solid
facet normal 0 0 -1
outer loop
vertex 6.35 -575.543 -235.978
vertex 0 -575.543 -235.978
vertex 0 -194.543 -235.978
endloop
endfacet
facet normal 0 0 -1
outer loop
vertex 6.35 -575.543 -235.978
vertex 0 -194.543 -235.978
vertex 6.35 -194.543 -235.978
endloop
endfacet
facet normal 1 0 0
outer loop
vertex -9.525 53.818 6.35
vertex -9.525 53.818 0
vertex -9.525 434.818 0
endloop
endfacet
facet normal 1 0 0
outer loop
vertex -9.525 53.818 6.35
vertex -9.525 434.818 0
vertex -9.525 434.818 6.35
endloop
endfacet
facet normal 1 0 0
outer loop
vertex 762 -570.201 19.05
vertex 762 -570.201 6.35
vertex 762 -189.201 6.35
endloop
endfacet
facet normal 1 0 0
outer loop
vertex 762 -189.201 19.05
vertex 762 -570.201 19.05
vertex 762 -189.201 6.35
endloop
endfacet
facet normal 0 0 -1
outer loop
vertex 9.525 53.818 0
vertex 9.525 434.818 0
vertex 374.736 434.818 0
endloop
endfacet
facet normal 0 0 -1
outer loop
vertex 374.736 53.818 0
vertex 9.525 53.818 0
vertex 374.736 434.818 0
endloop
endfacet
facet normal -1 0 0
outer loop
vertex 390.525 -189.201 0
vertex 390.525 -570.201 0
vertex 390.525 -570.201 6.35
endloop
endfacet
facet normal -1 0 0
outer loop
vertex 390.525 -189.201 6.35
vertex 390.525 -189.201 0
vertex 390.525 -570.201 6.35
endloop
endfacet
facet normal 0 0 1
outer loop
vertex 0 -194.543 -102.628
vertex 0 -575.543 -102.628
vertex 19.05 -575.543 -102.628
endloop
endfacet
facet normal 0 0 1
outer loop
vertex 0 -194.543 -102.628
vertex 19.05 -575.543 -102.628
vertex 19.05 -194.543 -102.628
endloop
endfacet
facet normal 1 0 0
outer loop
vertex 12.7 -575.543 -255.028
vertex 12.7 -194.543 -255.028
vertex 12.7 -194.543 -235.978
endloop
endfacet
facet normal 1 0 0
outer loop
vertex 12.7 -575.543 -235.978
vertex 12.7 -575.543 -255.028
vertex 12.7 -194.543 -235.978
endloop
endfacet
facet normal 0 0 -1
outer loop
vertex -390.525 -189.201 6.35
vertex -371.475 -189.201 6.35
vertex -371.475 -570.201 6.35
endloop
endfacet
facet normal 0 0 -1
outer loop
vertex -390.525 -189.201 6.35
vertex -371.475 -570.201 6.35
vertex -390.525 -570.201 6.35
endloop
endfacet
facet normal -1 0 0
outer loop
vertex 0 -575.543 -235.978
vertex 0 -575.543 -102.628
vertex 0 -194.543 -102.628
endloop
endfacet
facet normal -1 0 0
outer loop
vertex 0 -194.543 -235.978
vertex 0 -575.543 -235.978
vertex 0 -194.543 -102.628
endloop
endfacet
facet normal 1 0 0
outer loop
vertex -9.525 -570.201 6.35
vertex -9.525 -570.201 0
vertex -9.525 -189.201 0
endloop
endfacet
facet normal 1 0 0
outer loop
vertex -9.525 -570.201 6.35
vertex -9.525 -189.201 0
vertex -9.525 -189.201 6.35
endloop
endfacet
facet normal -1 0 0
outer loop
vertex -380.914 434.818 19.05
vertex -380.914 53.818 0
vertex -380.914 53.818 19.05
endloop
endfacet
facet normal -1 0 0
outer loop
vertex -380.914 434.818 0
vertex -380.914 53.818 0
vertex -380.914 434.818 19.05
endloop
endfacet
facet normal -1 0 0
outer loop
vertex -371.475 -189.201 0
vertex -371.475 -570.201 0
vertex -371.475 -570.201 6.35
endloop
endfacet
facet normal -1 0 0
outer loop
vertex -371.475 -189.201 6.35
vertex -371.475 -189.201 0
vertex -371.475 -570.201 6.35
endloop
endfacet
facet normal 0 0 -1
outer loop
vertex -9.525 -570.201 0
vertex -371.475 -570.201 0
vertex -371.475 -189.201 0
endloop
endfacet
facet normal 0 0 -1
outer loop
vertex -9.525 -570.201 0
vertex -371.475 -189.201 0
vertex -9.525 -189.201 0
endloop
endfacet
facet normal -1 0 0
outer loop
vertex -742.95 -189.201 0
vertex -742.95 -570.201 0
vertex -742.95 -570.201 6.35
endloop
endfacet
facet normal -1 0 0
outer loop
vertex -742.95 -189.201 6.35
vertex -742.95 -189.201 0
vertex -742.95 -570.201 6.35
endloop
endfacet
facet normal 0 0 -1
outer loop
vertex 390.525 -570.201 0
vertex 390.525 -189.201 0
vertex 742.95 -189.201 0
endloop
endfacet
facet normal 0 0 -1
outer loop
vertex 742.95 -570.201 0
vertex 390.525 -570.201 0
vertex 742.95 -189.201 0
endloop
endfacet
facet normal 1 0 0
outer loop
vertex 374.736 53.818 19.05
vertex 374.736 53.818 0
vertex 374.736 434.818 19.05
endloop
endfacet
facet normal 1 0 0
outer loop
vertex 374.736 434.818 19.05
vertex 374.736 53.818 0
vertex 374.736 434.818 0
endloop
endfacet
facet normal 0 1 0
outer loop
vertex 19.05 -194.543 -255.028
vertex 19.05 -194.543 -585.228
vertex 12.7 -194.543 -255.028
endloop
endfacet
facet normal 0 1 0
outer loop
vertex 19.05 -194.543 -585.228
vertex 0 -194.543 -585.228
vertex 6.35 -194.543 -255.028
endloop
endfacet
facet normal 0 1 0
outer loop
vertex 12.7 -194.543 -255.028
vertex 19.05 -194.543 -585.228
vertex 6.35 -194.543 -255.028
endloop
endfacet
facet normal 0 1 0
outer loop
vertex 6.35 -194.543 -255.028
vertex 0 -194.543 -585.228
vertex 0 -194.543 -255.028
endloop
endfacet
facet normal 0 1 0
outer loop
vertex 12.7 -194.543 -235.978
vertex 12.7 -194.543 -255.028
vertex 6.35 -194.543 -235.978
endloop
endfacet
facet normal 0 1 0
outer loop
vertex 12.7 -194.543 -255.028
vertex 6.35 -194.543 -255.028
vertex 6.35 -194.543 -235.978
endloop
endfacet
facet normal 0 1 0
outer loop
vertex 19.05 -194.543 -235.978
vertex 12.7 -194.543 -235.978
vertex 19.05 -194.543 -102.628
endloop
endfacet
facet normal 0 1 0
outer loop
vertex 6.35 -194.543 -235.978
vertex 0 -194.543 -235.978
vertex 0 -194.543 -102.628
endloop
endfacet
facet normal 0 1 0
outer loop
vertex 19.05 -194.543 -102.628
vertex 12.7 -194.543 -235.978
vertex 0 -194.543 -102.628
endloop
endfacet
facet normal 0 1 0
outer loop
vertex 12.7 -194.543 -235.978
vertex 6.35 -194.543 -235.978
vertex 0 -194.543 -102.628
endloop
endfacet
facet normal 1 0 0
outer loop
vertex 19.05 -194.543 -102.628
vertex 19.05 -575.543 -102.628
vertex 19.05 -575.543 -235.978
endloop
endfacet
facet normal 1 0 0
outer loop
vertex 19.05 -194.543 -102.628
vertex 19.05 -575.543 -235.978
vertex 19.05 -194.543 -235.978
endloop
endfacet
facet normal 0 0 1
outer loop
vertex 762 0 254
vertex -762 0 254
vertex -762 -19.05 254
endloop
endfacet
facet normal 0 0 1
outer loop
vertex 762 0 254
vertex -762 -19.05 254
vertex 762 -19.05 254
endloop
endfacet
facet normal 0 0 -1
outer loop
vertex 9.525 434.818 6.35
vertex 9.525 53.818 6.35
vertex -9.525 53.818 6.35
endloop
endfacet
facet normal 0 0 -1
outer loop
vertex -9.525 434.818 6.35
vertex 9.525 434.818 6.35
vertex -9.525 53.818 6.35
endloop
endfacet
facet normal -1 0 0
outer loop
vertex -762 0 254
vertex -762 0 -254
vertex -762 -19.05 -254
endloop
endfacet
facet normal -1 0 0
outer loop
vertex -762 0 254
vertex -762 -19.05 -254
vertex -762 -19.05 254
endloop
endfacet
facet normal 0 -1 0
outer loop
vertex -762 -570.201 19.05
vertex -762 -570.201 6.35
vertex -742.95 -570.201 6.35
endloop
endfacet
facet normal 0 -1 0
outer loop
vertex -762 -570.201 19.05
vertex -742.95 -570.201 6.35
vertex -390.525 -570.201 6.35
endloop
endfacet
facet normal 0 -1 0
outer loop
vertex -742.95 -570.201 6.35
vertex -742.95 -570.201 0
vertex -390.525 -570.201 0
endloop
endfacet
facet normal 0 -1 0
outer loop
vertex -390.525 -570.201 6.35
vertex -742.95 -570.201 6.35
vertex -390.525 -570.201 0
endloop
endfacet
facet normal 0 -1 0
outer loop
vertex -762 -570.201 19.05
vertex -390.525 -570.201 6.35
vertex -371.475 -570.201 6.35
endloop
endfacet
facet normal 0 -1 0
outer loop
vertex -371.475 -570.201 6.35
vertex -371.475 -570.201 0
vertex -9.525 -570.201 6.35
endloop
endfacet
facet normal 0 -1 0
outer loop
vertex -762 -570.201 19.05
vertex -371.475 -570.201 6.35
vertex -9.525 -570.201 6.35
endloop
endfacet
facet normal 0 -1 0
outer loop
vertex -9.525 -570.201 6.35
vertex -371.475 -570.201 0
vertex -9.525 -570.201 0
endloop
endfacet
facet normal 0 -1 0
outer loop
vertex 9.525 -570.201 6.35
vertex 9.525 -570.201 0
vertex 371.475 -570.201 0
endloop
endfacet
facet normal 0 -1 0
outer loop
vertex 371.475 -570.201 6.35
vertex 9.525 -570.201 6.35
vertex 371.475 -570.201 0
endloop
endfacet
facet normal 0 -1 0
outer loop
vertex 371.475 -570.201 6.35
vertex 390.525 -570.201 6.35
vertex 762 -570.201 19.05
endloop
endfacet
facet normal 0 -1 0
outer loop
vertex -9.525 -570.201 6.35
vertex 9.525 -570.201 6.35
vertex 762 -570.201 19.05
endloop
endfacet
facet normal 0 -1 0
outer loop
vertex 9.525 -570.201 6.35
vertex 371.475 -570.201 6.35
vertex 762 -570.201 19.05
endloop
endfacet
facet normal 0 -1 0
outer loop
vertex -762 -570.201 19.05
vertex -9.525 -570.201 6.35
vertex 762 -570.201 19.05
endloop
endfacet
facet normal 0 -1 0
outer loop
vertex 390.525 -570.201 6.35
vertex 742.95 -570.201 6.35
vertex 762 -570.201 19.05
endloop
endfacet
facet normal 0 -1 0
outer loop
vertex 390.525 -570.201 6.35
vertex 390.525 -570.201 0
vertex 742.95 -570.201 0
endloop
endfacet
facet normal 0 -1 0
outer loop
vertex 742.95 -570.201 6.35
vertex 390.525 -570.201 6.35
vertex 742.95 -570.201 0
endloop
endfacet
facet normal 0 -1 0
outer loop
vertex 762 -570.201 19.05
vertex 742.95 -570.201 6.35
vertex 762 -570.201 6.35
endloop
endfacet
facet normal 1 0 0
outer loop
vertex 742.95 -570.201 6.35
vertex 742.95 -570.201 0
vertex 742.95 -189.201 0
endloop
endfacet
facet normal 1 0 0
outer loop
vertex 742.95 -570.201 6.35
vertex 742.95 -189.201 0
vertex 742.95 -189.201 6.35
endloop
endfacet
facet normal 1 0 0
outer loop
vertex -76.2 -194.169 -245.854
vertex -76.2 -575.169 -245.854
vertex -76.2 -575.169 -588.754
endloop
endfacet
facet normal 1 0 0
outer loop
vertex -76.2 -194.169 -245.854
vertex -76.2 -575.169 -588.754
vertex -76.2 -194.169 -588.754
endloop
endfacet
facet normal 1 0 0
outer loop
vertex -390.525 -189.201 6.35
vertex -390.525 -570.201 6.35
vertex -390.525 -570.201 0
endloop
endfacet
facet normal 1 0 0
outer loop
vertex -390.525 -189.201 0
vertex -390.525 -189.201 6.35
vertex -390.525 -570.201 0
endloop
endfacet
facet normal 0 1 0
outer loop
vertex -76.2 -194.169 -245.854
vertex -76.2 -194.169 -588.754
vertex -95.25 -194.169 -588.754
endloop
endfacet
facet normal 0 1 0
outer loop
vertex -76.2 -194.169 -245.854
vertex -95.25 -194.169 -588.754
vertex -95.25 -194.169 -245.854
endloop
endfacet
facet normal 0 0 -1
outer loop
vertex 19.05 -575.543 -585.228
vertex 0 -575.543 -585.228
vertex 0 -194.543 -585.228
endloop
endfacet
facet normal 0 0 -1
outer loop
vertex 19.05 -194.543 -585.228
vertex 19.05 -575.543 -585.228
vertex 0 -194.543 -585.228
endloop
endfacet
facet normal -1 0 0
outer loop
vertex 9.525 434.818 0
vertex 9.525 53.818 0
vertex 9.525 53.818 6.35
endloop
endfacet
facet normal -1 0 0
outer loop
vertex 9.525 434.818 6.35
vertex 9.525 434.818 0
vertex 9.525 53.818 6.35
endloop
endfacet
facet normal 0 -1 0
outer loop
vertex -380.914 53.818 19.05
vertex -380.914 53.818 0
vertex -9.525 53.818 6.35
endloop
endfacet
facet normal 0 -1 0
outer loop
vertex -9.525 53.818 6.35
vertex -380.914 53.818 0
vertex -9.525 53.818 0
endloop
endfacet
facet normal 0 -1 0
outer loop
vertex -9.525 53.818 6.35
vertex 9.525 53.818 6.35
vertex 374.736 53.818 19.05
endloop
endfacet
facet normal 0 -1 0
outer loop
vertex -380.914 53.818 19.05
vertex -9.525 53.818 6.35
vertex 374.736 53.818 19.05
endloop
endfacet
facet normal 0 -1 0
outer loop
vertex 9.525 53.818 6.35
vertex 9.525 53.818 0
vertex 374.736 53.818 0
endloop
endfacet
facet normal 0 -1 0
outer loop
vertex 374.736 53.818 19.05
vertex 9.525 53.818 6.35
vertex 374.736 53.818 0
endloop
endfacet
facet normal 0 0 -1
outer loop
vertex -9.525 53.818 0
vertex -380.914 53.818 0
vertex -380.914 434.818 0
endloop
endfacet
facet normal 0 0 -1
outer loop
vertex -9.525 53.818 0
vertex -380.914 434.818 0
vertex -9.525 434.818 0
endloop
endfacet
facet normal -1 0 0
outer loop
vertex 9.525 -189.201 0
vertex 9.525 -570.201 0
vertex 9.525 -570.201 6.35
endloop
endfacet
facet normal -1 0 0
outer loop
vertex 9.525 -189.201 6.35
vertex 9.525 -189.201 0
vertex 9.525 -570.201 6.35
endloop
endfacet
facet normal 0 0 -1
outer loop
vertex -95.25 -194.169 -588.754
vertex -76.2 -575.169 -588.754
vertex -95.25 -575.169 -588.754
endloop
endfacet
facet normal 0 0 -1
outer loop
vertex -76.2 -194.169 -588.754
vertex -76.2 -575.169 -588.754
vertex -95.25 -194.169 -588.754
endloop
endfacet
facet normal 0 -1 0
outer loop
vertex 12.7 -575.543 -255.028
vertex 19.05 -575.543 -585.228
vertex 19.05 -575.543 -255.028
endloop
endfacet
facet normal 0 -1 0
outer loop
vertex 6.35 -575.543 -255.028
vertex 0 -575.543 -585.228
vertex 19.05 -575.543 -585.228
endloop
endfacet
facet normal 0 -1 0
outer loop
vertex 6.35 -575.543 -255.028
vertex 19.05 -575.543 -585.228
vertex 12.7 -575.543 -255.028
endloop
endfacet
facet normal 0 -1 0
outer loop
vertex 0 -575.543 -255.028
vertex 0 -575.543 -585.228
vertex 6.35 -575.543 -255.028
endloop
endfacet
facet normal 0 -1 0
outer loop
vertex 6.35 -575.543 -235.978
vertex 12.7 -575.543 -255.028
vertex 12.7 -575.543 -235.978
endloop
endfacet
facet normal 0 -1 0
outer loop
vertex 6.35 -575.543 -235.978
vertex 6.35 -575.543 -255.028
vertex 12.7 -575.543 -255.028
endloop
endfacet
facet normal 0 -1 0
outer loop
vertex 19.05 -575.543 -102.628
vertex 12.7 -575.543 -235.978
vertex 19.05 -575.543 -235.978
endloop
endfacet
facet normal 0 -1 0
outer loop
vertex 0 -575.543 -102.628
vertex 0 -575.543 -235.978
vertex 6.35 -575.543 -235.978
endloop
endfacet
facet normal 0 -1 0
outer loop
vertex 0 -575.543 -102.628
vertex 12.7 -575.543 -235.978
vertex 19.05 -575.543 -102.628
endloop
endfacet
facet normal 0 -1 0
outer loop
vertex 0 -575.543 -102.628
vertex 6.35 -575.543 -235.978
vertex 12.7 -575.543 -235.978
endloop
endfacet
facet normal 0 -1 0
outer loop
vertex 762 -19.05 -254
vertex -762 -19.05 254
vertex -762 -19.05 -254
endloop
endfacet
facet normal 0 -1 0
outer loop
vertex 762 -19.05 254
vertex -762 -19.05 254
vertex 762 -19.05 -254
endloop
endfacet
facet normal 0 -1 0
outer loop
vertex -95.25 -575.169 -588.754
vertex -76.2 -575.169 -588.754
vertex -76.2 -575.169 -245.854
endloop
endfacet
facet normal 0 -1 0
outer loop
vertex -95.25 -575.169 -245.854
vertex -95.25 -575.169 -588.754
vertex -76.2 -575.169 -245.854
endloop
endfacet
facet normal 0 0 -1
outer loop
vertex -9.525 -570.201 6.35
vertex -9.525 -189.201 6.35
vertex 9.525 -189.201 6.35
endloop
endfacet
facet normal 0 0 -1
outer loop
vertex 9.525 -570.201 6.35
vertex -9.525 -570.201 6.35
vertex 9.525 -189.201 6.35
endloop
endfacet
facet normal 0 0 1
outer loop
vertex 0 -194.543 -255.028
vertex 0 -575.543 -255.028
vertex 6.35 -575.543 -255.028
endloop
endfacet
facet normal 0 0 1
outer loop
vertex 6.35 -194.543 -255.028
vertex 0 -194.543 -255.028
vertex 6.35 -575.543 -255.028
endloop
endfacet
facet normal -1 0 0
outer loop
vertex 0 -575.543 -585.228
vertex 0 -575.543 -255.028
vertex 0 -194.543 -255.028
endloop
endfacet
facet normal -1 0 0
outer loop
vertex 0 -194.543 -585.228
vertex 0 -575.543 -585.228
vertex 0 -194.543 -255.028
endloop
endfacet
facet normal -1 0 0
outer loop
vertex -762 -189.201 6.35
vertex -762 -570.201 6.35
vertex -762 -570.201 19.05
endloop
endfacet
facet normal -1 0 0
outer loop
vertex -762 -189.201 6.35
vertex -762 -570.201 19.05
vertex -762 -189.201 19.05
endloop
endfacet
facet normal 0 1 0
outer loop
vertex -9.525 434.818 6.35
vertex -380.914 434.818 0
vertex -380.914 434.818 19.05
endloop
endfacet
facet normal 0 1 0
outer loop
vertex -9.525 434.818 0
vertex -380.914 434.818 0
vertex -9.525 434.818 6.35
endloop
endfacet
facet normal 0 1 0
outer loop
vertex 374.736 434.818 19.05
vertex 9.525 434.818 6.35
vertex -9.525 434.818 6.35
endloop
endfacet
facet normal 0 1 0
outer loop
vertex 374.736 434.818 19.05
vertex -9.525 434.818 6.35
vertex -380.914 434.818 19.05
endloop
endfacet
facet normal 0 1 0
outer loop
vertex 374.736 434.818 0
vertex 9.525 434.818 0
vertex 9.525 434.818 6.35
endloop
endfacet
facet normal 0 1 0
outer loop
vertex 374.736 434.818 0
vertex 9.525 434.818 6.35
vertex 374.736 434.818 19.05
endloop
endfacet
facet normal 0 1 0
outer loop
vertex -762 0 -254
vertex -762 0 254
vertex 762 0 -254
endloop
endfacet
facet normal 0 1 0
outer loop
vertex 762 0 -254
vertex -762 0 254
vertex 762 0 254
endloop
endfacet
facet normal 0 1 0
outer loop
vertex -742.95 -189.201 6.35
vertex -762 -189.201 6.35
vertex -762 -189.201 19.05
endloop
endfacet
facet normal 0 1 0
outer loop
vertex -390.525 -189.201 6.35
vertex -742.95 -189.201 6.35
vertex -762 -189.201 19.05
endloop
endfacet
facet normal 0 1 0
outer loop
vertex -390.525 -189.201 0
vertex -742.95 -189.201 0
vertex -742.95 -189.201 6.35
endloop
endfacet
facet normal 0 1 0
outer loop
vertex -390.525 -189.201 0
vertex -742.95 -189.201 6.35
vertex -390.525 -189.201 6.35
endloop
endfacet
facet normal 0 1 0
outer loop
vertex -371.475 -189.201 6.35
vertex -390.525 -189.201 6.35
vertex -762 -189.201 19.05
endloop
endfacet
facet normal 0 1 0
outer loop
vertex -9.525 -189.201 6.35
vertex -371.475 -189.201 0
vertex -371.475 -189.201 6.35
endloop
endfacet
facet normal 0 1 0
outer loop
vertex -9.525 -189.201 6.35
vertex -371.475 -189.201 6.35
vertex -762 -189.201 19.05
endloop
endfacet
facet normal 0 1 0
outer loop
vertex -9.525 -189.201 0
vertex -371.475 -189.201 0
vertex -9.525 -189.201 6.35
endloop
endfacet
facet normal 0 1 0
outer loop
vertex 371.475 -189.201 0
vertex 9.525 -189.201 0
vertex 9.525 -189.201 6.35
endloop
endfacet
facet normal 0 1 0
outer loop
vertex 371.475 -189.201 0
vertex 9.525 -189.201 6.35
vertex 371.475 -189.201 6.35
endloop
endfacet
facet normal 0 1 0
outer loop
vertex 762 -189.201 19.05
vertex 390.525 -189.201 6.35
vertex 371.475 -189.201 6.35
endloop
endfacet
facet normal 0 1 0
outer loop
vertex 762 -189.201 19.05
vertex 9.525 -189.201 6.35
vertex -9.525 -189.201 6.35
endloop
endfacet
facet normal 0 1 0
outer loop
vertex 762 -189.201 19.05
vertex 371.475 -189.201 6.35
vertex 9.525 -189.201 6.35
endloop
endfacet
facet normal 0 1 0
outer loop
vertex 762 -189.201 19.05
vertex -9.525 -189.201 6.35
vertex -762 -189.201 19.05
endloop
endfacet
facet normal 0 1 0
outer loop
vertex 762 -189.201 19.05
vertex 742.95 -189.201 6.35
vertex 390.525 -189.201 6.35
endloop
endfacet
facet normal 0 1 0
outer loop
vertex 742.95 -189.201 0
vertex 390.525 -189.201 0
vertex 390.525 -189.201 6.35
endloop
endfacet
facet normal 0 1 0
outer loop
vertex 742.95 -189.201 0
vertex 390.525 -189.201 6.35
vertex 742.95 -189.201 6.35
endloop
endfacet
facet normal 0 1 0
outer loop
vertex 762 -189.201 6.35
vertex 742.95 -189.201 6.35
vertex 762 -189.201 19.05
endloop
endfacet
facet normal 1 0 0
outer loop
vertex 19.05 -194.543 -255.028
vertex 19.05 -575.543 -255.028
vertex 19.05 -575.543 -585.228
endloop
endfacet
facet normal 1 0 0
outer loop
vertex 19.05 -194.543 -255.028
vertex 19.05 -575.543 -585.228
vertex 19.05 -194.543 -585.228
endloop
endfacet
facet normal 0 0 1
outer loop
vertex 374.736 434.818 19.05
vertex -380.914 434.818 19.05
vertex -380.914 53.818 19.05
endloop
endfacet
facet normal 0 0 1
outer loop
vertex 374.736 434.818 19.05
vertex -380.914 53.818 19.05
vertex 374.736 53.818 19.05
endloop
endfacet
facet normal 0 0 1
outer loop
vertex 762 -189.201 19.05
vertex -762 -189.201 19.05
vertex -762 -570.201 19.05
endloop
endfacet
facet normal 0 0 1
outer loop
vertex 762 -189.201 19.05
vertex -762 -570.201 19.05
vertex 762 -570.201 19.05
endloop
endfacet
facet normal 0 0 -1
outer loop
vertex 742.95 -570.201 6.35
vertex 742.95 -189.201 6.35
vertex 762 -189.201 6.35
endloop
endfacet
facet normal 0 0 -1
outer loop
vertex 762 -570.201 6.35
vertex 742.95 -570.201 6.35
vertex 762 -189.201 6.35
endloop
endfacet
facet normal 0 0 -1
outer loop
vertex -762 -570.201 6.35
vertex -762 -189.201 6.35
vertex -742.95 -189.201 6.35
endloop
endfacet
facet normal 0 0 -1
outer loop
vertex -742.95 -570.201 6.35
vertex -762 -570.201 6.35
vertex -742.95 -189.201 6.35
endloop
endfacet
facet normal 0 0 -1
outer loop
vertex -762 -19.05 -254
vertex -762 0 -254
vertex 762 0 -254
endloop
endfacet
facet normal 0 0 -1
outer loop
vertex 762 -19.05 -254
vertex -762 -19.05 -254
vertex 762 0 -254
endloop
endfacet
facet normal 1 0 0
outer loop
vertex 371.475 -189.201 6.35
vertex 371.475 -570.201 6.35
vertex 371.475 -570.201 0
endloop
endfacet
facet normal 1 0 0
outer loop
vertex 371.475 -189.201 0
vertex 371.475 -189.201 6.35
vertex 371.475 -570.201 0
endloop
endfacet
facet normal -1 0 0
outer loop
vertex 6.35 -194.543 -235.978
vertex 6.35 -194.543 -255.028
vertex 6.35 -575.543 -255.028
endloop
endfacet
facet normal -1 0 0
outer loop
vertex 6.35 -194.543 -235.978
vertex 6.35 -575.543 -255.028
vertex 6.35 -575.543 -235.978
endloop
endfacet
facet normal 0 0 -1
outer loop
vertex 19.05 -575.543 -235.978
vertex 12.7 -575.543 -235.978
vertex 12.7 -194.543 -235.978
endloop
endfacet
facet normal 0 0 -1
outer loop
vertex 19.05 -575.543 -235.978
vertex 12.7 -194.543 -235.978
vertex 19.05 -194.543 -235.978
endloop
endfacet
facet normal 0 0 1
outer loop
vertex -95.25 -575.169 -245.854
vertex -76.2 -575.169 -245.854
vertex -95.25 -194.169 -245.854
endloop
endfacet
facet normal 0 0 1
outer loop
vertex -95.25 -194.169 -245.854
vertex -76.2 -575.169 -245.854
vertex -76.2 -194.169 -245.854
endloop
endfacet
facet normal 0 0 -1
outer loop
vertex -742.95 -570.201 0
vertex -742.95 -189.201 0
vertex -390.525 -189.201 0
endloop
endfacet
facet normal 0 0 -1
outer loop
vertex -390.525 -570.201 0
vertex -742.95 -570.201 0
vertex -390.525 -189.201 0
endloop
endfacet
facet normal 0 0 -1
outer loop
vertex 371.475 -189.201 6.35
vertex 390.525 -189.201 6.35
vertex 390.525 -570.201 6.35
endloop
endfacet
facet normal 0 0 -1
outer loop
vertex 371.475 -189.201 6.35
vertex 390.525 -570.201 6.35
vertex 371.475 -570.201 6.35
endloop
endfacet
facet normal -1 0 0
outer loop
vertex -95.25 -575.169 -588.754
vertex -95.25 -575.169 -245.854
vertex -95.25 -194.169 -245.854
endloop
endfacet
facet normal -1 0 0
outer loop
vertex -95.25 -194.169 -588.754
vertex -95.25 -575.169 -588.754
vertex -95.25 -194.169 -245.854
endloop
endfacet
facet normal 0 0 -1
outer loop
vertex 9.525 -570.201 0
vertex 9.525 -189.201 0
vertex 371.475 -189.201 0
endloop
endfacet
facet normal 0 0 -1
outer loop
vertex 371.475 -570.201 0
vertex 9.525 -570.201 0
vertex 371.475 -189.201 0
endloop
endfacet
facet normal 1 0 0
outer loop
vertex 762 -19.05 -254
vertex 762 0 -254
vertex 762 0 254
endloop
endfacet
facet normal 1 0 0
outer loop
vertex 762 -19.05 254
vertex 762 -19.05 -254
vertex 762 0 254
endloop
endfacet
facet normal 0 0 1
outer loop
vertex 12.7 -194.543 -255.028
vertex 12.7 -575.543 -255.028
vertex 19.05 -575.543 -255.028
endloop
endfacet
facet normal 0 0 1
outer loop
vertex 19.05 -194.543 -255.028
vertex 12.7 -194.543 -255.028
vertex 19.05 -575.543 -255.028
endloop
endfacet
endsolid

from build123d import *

# Parameters (mm, degrees)
F0_W      = 1524
F0_H      = 508
F1_DEPTH  = 19.05
F2_W      = 1524
F2_H      = 381
F3_DEPTH  = 19.05
F4_W      = 381
F4_H      = 482.6
F5_DEPTH  = 19.05
F6_W      = 19.05
F6_H      = 6.35
F7_DEPTH  = 381
F8_W      = 6.35
F8_H      = 19.05
F9_DEPTH  = 381
F10_W     = 755.65
F10_H     = 381
F11_DEPTH = 19.05
F12_W     = 19.05
F12_H     = 6.35
F13_DEPTH = 381
F15_START = -76.2
F14_W     = 381
F14_H     = 342.9
F15_DEPTH = 19.05


with BuildPart() as f1:
    # F0 (on Front) → F1 (new body)
    with BuildSketch(Plane.XZ):
        Rectangle(F0_W, F0_H)
    extrude(amount=F1_DEPTH)


with BuildPart() as f3:
    # F2 (on Top) → F3 (new body)
    with BuildSketch(Plane.XY):
        with Locations((0, -379.7005197639)):
            Rectangle(F2_W, F2_H)
    extrude(amount=F3_DEPTH)

    # F6 (on face) → F7 (cut)
    with BuildSketch(Plane.XZ.offset(570.2005197639)):
        with Locations((-752.475, 3.175)):
            Rectangle(F6_W, F6_H)
        Polygon((-390.525, 6.35), (-390.525, 0), (-381, 0), (-371.475, 0), (-371.475, 6.35), align=None)
        with Locations((0, 3.175)):
            Rectangle(F6_W, F6_H)
        Polygon((371.475, 6.35), (371.475, 0), (381, 0), (390.525, 0), (390.525, 6.35), align=None)
        with Locations((752.475, 3.175)):
            Rectangle(F6_W, F6_H)
    extrude(amount=-F7_DEPTH, mode=Mode.SUBTRACT)


with BuildPart() as f5:
    # F4 (on Right) → F5 (new body)
    with BuildSketch(Plane.YZ):
        with Locations((-385.0430771708, -343.9277655403)):
            Rectangle(F4_W, F4_H)
    extrude(amount=F5_DEPTH)

    # F8 (on face) → F9 (cut)
    with BuildSketch(Plane.XZ.offset(575.5430771708)):
        with Locations((15.875, -245.5027655403)):
            Rectangle(F8_W, F8_H)
        with Locations((3.175, -245.5027655403)):
            Rectangle(F8_W, F8_H)
    extrude(amount=-F9_DEPTH, mode=Mode.SUBTRACT)


with BuildPart() as f11:
    # F10 (on Top) → F11 (new body)
    with BuildSketch(Plane.XY):
        with Locations((-3.088874507, 244.3180690193)):
            Rectangle(F10_W, F10_H)
    extrude(amount=F11_DEPTH)

    # F12 (on face) → F13 (cut)
    with BuildSketch(Plane(origin=(0, 434.8180690193, 0), x_dir=(-1, 0, 0), z_dir=(0, 1, 0))):
        with Locations((0, 3.175)):
            Rectangle(F12_W, F12_H)
    extrude(amount=-F13_DEPTH, mode=Mode.SUBTRACT)


with BuildPart() as f15:
    # F14 (on Right) → F15 (new body)
    with BuildSketch(Plane.YZ.offset(F15_START)):
        with Locations((-384.6694380045, -417.3035614729)):
            Rectangle(F14_W, F14_H)
    extrude(amount=-F15_DEPTH)


solid = Compound([f1.part, f3.part, f5.part, f11.part, f15.part])
